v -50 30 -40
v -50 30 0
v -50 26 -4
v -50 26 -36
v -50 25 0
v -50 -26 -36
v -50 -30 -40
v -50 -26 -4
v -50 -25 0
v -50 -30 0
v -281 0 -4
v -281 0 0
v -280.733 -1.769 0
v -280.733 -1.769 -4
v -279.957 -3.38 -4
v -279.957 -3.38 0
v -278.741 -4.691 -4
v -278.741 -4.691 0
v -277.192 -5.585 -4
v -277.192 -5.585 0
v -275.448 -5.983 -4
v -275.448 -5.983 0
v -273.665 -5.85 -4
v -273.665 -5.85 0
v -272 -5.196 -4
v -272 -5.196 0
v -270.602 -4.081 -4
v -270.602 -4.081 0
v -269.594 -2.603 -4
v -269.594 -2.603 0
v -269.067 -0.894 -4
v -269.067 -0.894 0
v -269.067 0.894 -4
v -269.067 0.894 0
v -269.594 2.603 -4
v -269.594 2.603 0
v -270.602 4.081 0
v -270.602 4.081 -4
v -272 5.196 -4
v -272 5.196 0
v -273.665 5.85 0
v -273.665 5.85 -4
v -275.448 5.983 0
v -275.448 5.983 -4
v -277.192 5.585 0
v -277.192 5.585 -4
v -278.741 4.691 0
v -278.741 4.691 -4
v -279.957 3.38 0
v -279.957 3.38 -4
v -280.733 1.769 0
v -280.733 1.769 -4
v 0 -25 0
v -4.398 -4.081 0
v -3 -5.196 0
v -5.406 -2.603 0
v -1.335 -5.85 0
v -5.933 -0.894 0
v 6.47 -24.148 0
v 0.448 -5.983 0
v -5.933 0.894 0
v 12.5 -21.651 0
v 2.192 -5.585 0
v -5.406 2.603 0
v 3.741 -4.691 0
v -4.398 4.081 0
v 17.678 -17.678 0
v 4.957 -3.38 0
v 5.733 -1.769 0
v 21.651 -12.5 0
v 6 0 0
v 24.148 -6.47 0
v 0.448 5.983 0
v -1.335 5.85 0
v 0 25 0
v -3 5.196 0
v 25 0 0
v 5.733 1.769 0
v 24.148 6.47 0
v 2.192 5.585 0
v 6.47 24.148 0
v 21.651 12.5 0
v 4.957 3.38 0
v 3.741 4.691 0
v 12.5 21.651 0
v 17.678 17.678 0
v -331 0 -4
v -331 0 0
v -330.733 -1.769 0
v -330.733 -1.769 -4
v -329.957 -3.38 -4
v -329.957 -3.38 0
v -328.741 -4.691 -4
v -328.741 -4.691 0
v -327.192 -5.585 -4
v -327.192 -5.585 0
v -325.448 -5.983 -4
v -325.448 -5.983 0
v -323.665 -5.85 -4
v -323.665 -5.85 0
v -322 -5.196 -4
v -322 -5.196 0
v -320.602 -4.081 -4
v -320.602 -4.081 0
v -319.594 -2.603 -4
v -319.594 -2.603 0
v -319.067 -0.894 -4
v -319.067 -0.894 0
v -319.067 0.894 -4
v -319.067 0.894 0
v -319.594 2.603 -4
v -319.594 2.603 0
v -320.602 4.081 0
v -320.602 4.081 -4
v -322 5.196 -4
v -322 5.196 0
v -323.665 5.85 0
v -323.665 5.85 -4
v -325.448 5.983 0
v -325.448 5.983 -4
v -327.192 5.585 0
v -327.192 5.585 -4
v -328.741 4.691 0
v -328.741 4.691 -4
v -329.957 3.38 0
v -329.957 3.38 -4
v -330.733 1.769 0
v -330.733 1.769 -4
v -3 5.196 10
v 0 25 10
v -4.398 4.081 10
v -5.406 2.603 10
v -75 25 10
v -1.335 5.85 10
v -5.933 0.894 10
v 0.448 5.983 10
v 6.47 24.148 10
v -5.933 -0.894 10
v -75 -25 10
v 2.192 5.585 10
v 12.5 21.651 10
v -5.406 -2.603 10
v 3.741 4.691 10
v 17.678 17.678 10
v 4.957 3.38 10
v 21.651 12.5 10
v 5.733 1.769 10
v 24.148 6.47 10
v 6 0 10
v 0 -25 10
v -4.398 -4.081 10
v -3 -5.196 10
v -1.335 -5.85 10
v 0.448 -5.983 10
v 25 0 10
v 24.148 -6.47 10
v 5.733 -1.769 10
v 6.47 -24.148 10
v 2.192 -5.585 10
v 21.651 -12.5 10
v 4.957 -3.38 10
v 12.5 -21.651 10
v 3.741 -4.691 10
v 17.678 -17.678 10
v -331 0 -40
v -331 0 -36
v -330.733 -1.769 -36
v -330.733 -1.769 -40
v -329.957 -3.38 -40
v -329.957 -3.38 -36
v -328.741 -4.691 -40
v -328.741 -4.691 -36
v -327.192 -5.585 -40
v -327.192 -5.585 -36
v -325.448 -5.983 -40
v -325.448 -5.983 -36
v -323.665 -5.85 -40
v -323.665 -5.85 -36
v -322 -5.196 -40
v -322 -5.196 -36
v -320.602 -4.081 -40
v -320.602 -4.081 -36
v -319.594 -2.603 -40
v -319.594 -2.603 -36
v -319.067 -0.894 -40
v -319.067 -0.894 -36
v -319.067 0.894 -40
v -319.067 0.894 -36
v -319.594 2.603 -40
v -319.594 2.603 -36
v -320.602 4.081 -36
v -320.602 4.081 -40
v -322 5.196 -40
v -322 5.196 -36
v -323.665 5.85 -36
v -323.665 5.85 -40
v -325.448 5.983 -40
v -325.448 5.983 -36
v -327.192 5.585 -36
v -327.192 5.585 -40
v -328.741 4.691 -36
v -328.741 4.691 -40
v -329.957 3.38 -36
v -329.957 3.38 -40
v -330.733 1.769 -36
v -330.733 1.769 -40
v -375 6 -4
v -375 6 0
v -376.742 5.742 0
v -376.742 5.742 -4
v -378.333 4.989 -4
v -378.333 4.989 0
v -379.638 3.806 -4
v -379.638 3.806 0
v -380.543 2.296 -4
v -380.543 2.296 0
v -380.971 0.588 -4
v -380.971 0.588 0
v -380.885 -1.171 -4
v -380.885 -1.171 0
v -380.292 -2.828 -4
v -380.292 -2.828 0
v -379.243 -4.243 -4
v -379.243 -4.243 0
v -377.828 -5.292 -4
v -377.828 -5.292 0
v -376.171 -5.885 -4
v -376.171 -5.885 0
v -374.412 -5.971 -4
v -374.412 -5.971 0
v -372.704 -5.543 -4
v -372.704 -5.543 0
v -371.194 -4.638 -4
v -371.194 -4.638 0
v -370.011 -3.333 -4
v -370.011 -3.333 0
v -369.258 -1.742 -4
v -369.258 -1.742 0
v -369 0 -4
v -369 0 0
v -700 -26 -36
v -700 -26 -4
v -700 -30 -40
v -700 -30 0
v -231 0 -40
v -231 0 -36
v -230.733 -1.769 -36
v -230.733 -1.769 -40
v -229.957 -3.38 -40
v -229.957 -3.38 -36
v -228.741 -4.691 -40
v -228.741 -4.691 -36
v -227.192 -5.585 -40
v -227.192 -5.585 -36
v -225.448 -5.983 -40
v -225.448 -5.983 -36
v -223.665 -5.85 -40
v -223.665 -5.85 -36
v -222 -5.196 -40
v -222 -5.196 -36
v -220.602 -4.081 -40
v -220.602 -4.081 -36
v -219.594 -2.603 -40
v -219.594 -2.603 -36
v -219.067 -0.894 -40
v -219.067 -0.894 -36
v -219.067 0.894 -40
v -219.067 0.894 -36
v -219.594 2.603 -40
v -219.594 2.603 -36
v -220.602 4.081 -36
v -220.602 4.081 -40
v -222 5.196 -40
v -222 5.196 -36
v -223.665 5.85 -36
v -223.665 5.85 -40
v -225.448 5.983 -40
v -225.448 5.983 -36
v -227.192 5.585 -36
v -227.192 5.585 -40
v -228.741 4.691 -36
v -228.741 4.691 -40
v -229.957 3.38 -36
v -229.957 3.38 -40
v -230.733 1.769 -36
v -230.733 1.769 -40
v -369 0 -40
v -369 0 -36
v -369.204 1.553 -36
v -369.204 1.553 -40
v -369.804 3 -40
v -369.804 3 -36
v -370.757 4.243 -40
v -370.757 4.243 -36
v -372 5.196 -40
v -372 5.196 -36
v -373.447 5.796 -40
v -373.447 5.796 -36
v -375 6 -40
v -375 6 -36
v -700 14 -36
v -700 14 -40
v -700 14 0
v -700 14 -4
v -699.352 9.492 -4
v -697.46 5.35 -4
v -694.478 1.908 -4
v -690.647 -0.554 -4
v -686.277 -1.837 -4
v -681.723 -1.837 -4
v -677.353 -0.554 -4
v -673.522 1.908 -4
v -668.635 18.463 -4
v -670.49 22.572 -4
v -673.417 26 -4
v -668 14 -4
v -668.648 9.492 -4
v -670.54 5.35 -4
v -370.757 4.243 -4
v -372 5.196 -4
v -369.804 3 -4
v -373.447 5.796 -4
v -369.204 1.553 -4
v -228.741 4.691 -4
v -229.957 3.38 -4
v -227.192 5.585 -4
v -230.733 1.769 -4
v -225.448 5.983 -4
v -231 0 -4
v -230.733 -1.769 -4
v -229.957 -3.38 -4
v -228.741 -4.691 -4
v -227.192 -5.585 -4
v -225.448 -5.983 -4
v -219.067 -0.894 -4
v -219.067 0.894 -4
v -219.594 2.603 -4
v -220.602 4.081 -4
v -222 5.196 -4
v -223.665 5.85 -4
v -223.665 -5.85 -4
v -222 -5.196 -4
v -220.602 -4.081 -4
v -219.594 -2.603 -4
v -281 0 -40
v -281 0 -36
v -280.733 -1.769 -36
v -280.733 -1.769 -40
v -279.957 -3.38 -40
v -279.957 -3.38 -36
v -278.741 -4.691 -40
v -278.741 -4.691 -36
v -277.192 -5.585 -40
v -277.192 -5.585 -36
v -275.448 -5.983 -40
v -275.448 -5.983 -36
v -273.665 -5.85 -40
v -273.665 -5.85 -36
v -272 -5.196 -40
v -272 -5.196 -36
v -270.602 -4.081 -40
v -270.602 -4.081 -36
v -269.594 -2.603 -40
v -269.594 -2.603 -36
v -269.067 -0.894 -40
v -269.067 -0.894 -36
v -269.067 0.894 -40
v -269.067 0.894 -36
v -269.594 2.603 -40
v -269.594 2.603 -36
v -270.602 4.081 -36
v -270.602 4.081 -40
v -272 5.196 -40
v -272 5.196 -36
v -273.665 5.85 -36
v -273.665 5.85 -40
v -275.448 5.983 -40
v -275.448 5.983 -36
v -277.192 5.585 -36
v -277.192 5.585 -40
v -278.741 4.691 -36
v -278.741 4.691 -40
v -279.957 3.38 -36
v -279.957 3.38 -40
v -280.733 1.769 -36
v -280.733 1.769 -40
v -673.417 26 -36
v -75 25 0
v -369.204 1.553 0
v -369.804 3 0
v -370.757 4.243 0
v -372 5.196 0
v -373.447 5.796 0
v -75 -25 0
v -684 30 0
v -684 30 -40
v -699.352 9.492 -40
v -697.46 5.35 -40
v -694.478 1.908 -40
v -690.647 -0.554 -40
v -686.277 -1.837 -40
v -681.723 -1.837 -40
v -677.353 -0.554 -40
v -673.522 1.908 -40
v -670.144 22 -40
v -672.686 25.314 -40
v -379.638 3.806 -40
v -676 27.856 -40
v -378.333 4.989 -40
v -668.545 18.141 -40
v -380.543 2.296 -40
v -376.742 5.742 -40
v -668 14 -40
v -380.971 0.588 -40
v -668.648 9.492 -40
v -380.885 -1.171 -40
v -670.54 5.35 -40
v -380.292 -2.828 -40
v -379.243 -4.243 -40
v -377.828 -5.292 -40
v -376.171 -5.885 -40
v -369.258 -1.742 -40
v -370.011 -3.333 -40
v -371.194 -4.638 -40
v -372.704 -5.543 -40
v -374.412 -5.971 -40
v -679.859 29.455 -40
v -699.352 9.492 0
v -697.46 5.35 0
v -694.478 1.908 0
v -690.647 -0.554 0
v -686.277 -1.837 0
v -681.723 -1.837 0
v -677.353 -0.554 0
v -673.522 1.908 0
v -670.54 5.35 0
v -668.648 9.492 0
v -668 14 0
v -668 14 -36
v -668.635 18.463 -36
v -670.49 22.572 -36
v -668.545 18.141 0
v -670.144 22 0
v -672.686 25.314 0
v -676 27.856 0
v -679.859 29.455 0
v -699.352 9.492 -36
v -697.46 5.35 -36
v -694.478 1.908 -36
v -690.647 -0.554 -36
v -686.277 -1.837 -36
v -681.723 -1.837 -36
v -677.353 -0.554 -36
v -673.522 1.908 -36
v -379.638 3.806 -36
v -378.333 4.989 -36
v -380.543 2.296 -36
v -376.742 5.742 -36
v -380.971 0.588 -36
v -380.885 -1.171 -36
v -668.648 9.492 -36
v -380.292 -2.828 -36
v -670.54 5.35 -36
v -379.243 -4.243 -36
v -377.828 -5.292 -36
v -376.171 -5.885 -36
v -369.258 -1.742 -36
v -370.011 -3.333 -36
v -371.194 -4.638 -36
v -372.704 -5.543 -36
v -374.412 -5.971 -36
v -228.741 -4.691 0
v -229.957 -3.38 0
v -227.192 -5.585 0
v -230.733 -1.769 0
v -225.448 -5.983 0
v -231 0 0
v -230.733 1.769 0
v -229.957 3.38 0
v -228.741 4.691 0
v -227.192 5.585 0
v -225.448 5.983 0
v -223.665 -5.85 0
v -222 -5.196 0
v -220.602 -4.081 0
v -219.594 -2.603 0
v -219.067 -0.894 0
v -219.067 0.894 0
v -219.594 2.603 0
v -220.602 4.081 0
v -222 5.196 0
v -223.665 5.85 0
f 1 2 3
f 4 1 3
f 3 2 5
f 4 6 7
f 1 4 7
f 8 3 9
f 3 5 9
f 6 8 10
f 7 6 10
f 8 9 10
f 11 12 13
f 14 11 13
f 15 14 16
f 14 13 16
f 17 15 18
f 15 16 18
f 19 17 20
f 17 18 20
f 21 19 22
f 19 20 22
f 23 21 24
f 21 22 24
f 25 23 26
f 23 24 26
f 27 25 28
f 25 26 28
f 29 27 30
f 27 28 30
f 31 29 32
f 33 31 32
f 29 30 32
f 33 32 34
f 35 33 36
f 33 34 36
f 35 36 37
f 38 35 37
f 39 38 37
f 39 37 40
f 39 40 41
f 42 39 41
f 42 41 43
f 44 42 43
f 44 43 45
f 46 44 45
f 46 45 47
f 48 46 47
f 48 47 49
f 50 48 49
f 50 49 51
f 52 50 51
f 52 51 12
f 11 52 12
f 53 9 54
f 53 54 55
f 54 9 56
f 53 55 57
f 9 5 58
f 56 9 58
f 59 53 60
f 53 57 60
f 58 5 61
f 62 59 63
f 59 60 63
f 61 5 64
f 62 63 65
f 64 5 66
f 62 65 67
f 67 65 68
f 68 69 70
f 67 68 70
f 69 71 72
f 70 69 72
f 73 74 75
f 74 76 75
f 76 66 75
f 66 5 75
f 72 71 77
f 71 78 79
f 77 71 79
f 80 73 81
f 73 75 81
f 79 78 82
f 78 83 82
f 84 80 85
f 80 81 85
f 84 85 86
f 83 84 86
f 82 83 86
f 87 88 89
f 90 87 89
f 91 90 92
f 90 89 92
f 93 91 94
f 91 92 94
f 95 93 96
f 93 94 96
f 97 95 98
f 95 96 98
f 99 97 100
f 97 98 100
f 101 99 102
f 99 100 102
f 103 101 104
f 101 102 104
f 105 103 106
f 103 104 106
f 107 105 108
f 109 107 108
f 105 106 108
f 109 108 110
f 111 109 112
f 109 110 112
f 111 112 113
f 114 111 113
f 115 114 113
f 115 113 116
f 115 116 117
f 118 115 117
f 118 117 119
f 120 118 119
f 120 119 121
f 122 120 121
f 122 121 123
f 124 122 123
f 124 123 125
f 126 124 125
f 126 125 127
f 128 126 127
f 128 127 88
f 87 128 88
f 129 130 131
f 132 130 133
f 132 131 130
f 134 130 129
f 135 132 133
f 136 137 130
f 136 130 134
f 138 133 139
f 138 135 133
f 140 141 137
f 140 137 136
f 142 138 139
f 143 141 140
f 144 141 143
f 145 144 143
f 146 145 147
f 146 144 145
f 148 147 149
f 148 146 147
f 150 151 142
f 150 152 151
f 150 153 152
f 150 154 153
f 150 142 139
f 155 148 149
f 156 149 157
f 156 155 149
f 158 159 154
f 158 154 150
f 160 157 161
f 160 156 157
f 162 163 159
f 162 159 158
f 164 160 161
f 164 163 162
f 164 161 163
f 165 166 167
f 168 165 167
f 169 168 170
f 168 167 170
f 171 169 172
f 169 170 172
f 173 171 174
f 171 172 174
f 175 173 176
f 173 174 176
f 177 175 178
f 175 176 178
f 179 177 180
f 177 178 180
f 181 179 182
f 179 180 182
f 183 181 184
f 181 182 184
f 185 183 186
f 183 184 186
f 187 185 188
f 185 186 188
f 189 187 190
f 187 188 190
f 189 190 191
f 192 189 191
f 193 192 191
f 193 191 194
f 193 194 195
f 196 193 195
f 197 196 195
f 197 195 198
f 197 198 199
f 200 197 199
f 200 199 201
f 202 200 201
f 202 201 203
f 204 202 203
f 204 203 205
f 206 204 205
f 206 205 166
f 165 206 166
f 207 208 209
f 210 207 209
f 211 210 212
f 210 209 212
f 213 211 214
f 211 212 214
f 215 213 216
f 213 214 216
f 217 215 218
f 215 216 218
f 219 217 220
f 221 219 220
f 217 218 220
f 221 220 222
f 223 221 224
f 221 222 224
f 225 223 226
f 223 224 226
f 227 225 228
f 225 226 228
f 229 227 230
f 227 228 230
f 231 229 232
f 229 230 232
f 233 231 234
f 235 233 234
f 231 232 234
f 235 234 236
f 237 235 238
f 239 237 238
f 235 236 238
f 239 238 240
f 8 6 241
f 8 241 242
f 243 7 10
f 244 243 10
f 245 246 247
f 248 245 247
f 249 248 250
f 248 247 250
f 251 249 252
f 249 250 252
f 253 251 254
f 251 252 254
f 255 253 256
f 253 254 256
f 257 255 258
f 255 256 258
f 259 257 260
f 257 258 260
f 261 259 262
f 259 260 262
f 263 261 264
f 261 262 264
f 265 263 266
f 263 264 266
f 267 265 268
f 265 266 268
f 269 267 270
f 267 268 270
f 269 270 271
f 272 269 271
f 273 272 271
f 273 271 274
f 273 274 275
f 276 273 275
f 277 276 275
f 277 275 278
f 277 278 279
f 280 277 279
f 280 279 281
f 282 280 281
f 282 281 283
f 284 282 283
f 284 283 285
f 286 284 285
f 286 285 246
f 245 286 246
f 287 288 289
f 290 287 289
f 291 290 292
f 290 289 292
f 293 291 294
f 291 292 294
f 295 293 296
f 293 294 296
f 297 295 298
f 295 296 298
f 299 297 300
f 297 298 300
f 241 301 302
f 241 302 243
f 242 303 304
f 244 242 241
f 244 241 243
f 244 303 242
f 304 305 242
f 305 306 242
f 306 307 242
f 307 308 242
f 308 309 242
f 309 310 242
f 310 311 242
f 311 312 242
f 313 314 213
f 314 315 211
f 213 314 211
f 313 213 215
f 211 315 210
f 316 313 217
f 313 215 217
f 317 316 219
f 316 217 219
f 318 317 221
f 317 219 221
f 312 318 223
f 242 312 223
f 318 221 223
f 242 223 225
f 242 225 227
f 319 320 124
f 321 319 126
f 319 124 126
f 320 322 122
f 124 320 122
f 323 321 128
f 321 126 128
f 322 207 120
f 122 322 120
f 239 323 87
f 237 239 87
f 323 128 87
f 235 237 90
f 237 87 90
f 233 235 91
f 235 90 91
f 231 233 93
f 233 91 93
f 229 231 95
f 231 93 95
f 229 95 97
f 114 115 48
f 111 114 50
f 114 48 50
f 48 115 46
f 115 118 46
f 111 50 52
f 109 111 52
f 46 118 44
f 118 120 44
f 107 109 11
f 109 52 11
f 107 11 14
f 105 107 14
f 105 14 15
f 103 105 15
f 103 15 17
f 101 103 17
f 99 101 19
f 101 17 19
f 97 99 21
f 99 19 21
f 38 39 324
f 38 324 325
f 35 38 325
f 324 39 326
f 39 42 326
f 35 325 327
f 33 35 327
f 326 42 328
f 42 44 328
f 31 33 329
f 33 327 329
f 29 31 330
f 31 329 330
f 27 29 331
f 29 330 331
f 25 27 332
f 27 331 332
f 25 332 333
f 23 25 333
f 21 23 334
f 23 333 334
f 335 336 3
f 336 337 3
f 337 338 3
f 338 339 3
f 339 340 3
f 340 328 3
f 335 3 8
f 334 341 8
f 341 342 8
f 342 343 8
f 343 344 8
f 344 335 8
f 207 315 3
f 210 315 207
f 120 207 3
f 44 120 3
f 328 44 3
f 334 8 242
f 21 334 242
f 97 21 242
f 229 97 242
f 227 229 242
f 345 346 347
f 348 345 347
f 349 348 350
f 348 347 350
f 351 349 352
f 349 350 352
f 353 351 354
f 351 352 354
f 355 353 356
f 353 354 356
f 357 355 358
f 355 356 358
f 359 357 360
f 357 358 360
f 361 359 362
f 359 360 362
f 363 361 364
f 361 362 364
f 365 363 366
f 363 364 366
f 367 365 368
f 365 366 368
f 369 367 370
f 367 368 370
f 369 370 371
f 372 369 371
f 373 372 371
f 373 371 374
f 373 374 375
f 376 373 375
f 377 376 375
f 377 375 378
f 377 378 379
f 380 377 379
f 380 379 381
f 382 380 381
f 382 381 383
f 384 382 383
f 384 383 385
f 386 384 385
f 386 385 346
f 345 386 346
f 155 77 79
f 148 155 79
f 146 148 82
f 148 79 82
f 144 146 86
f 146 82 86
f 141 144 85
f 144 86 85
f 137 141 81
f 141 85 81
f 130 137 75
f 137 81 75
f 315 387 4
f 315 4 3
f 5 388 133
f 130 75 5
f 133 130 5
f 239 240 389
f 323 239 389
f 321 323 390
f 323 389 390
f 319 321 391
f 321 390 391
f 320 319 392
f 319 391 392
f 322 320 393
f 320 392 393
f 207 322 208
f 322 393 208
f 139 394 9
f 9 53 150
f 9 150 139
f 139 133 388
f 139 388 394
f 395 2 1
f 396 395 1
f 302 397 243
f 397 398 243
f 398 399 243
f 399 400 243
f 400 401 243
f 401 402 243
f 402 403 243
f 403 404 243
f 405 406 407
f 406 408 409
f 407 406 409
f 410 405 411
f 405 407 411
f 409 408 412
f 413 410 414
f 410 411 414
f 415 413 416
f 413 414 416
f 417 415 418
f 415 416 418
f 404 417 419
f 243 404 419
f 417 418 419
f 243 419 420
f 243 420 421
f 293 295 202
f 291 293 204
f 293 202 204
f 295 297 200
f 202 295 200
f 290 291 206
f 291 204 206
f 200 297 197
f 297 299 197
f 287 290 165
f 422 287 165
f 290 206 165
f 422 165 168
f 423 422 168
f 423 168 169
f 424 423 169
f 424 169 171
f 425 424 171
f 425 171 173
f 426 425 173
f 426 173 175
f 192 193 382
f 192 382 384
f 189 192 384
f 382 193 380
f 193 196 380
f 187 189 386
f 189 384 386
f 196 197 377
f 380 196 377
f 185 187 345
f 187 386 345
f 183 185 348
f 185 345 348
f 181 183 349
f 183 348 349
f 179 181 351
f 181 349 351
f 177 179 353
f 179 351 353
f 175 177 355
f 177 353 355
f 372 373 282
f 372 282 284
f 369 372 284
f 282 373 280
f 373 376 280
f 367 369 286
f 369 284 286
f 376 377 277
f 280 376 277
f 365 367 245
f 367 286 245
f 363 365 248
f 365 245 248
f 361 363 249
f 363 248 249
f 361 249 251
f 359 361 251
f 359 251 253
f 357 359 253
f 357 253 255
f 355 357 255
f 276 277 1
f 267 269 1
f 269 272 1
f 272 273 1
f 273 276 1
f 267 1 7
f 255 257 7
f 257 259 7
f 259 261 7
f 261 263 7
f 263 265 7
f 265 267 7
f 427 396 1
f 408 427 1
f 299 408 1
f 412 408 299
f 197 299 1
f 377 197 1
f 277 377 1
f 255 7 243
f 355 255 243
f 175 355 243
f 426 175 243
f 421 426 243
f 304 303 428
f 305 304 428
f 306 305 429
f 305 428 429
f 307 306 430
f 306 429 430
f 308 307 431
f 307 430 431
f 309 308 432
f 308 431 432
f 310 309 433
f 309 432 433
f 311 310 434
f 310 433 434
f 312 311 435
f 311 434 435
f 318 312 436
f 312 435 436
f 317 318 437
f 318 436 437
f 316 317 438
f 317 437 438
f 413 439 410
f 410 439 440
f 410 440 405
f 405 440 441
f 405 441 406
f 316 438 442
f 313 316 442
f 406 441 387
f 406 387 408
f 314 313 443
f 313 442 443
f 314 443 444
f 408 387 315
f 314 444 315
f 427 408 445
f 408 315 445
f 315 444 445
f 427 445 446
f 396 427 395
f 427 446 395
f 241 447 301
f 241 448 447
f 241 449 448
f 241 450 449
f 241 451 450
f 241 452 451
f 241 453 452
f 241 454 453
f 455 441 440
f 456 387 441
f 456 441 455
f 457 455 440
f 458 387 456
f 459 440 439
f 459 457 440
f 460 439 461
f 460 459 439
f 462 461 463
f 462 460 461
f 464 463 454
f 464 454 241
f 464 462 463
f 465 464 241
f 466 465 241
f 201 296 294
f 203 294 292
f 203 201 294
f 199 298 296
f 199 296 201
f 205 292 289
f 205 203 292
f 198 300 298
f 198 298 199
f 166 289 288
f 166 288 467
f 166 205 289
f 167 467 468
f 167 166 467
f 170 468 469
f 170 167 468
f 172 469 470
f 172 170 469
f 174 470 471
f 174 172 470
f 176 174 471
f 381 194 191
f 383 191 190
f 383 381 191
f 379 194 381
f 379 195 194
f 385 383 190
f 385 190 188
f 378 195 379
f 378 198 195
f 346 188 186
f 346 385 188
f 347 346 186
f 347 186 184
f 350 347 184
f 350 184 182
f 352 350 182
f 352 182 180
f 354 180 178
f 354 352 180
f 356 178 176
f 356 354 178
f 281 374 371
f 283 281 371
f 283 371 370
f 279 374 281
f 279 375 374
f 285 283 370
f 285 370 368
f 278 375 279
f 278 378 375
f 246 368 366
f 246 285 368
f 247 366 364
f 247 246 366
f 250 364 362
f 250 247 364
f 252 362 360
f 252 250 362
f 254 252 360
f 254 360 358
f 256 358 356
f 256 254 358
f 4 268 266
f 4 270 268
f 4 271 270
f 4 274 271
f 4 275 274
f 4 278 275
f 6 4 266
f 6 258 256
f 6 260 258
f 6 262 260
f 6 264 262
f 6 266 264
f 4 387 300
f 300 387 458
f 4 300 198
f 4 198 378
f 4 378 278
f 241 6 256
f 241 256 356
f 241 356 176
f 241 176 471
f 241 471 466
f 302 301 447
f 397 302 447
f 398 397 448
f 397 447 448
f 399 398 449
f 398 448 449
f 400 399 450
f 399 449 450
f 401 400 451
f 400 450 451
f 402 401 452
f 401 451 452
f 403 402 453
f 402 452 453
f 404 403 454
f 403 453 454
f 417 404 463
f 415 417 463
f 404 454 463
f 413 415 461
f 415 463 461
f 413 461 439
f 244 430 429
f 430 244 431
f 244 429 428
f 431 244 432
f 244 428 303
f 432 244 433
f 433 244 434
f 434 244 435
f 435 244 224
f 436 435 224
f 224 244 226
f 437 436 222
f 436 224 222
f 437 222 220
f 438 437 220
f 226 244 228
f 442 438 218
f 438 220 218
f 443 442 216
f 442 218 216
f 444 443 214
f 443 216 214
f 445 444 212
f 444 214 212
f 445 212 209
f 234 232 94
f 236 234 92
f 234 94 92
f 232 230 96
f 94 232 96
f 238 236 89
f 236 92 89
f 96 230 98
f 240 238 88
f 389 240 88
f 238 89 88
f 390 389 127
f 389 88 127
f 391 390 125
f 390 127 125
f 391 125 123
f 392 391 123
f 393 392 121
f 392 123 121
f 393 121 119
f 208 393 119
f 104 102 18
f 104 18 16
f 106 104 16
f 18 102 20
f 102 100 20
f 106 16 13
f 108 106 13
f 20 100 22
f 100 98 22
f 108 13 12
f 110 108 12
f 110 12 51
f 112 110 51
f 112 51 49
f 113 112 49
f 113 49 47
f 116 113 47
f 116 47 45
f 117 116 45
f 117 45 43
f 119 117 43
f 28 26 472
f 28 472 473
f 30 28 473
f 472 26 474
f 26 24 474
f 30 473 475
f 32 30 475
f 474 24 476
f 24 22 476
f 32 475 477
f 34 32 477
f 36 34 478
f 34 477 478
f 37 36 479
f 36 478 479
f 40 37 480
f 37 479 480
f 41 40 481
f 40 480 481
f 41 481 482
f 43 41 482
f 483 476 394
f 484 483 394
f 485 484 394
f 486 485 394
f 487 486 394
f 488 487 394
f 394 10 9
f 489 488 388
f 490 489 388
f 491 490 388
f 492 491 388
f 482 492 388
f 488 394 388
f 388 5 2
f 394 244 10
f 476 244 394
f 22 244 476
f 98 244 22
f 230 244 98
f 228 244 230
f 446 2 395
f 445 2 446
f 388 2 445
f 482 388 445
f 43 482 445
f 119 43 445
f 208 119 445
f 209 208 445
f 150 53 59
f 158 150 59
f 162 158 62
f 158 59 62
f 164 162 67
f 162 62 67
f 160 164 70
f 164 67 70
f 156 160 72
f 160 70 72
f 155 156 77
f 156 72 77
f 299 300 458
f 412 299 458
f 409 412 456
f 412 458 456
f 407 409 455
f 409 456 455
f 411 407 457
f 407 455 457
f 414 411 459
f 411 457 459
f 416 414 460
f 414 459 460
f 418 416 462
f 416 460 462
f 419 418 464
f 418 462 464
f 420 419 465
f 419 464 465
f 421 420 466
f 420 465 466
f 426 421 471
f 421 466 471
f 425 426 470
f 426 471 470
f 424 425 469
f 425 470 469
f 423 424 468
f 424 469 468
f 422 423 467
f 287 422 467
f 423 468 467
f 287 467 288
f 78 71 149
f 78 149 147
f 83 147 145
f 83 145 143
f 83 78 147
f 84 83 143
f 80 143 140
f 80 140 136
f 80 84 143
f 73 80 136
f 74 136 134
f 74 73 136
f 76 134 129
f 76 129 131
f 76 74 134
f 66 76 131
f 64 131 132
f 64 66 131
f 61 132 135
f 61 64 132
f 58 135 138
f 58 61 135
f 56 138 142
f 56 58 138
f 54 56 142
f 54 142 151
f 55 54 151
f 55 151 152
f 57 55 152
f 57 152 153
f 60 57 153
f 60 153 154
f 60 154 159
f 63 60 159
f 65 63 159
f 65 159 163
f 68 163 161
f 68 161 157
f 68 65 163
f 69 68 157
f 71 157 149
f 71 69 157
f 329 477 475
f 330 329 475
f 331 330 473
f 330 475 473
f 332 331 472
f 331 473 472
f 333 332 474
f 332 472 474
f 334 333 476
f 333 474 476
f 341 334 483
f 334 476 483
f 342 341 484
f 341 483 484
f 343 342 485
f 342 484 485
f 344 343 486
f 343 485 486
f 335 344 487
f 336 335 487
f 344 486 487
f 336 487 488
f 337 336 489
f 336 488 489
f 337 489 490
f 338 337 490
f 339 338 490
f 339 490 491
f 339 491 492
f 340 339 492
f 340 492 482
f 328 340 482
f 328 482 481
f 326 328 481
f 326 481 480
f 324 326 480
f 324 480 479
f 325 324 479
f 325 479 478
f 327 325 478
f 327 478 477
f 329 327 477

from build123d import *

# Parameters (mm, degrees)
F0_R      = 6
F1_DEPTH  = 10
F2_W      = 52
F2_H      = 32
F3_DEPTH  = 650
F1_FACE_W = 50
F1_FACE_H = 10
F4_DEPTH  = 25
F6_DEPTH  = 40
F8_DEPTH  = 40


with BuildPart() as f1:
    # F0 (on Top) → F1 (new body)
    with BuildSketch(Plane.XY):
        with BuildLine():
            ThreePointArc((0, -25), (17.67767, -17.67767), (25, 0))
            ThreePointArc((25, 0), (17.67767, 17.67767), (0, 25))
            ThreePointArc((0, 25), (-25, 0), (0, -25))
        make_face()
        Circle(F0_R, mode=Mode.SUBTRACT)
        with BuildLine():
            ThreePointArc((0, -25), (-25, 0), (0, 25))
            Line((0, 25), (-50, 25))
            Line((-50, 25), (-50, -25))
            Line((-50, -25), (0, -25))
        make_face()
    extrude(amount=F1_DEPTH)



with BuildPart() as f3:
    # F2 (on face) → F3 (new body)
    with BuildSketch(Plane(origin=(-50, 0, 0), x_dir=(0, -1, 0), z_dir=(-1, 0, 0))):
        Polygon((30, 0), (0, 0), (-30, 0), (-30, -40), (30, -40), align=None)
        with Locations((0, -20)):
            Rectangle(F2_W, F2_H, mode=Mode.SUBTRACT)
    extrude(amount=F3_DEPTH)


with BuildPart() as f1_1:
    add(f1.part)

    add(f3.part)  # F4 merges F3
    # F1_face (on face) → F4 (join)
    with BuildSketch(Plane(origin=(-50, 0, 5), x_dir=(0, -1, 0), z_dir=(-1, 0, 0))):
        Rectangle(F1_FACE_W, F1_FACE_H)
    extrude(amount=F4_DEPTH)

    # F5 (on face) → F6 (cut)
    with BuildSketch(Plane.XY):
        with BuildLine():
            ThreePointArc((-369, 0), (-370.757359, 4.242641), (-375, 6))
            Line((-375, 6), (-375, 0))
            Line((-375, 0), (-369, 0))
        make_face()
        with BuildLine():
            ThreePointArc((-219, 0), (-225, 6), (-231, 0))
            ThreePointArc((-231, 0), (-225, -6), (-219, 0))
        make_face()
        with BuildLine():
            ThreePointArc((-269, 0), (-275, 6), (-281, 0))
            Line((-281, 0), (-275, 0))
            Line((-275, 0), (-269, 0))
        make_face()
        with BuildLine():
            Line((-275, 0), (-281, 0))
            ThreePointArc((-281, 0), (-275, -6), (-269, 0))
            Line((-269, 0), (-275, 0))
        make_face()
        with BuildLine():
            ThreePointArc((-319, 0), (-325, 6), (-331, 0))
            Line((-331, 0), (-325, 0))
            Line((-325, 0), (-319, 0))
        make_face()
        with BuildLine():
            Line((-325, 0), (-331, 0))
            ThreePointArc((-331, 0), (-325, -6), (-319, 0))
            Line((-319, 0), (-325, 0))
        make_face()
        with BuildLine():
            Line((-375, 0), (-375, 6))
            ThreePointArc((-375, 6), (-379.242641, -4.242641), (-369, 0))
            Line((-369, 0), (-375, 0))
        make_face()
    extrude(amount=-F6_DEPTH, mode=Mode.SUBTRACT)

    # F7 (on face) → F8 (cut)
    with BuildSketch(Plane.XY):
        with BuildLine():
            Line((-684, 30), (-700, 30))
            Line((-700, 30), (-700, 14))
            ThreePointArc((-700, 14), (-695.313708, 25.313708), (-684, 30))
        make_face()
        with BuildLine():
            ThreePointArc((-668, 14), (-672.686292, 25.313708), (-684, 30))
            ThreePointArc((-684, 30), (-695.313708, 25.313708), (-700, 14))
            ThreePointArc((-700, 14), (-684, -2), (-668, 14))
        make_face()
    extrude(amount=-F8_DEPTH, mode=Mode.SUBTRACT)


solid = f1_1.part
